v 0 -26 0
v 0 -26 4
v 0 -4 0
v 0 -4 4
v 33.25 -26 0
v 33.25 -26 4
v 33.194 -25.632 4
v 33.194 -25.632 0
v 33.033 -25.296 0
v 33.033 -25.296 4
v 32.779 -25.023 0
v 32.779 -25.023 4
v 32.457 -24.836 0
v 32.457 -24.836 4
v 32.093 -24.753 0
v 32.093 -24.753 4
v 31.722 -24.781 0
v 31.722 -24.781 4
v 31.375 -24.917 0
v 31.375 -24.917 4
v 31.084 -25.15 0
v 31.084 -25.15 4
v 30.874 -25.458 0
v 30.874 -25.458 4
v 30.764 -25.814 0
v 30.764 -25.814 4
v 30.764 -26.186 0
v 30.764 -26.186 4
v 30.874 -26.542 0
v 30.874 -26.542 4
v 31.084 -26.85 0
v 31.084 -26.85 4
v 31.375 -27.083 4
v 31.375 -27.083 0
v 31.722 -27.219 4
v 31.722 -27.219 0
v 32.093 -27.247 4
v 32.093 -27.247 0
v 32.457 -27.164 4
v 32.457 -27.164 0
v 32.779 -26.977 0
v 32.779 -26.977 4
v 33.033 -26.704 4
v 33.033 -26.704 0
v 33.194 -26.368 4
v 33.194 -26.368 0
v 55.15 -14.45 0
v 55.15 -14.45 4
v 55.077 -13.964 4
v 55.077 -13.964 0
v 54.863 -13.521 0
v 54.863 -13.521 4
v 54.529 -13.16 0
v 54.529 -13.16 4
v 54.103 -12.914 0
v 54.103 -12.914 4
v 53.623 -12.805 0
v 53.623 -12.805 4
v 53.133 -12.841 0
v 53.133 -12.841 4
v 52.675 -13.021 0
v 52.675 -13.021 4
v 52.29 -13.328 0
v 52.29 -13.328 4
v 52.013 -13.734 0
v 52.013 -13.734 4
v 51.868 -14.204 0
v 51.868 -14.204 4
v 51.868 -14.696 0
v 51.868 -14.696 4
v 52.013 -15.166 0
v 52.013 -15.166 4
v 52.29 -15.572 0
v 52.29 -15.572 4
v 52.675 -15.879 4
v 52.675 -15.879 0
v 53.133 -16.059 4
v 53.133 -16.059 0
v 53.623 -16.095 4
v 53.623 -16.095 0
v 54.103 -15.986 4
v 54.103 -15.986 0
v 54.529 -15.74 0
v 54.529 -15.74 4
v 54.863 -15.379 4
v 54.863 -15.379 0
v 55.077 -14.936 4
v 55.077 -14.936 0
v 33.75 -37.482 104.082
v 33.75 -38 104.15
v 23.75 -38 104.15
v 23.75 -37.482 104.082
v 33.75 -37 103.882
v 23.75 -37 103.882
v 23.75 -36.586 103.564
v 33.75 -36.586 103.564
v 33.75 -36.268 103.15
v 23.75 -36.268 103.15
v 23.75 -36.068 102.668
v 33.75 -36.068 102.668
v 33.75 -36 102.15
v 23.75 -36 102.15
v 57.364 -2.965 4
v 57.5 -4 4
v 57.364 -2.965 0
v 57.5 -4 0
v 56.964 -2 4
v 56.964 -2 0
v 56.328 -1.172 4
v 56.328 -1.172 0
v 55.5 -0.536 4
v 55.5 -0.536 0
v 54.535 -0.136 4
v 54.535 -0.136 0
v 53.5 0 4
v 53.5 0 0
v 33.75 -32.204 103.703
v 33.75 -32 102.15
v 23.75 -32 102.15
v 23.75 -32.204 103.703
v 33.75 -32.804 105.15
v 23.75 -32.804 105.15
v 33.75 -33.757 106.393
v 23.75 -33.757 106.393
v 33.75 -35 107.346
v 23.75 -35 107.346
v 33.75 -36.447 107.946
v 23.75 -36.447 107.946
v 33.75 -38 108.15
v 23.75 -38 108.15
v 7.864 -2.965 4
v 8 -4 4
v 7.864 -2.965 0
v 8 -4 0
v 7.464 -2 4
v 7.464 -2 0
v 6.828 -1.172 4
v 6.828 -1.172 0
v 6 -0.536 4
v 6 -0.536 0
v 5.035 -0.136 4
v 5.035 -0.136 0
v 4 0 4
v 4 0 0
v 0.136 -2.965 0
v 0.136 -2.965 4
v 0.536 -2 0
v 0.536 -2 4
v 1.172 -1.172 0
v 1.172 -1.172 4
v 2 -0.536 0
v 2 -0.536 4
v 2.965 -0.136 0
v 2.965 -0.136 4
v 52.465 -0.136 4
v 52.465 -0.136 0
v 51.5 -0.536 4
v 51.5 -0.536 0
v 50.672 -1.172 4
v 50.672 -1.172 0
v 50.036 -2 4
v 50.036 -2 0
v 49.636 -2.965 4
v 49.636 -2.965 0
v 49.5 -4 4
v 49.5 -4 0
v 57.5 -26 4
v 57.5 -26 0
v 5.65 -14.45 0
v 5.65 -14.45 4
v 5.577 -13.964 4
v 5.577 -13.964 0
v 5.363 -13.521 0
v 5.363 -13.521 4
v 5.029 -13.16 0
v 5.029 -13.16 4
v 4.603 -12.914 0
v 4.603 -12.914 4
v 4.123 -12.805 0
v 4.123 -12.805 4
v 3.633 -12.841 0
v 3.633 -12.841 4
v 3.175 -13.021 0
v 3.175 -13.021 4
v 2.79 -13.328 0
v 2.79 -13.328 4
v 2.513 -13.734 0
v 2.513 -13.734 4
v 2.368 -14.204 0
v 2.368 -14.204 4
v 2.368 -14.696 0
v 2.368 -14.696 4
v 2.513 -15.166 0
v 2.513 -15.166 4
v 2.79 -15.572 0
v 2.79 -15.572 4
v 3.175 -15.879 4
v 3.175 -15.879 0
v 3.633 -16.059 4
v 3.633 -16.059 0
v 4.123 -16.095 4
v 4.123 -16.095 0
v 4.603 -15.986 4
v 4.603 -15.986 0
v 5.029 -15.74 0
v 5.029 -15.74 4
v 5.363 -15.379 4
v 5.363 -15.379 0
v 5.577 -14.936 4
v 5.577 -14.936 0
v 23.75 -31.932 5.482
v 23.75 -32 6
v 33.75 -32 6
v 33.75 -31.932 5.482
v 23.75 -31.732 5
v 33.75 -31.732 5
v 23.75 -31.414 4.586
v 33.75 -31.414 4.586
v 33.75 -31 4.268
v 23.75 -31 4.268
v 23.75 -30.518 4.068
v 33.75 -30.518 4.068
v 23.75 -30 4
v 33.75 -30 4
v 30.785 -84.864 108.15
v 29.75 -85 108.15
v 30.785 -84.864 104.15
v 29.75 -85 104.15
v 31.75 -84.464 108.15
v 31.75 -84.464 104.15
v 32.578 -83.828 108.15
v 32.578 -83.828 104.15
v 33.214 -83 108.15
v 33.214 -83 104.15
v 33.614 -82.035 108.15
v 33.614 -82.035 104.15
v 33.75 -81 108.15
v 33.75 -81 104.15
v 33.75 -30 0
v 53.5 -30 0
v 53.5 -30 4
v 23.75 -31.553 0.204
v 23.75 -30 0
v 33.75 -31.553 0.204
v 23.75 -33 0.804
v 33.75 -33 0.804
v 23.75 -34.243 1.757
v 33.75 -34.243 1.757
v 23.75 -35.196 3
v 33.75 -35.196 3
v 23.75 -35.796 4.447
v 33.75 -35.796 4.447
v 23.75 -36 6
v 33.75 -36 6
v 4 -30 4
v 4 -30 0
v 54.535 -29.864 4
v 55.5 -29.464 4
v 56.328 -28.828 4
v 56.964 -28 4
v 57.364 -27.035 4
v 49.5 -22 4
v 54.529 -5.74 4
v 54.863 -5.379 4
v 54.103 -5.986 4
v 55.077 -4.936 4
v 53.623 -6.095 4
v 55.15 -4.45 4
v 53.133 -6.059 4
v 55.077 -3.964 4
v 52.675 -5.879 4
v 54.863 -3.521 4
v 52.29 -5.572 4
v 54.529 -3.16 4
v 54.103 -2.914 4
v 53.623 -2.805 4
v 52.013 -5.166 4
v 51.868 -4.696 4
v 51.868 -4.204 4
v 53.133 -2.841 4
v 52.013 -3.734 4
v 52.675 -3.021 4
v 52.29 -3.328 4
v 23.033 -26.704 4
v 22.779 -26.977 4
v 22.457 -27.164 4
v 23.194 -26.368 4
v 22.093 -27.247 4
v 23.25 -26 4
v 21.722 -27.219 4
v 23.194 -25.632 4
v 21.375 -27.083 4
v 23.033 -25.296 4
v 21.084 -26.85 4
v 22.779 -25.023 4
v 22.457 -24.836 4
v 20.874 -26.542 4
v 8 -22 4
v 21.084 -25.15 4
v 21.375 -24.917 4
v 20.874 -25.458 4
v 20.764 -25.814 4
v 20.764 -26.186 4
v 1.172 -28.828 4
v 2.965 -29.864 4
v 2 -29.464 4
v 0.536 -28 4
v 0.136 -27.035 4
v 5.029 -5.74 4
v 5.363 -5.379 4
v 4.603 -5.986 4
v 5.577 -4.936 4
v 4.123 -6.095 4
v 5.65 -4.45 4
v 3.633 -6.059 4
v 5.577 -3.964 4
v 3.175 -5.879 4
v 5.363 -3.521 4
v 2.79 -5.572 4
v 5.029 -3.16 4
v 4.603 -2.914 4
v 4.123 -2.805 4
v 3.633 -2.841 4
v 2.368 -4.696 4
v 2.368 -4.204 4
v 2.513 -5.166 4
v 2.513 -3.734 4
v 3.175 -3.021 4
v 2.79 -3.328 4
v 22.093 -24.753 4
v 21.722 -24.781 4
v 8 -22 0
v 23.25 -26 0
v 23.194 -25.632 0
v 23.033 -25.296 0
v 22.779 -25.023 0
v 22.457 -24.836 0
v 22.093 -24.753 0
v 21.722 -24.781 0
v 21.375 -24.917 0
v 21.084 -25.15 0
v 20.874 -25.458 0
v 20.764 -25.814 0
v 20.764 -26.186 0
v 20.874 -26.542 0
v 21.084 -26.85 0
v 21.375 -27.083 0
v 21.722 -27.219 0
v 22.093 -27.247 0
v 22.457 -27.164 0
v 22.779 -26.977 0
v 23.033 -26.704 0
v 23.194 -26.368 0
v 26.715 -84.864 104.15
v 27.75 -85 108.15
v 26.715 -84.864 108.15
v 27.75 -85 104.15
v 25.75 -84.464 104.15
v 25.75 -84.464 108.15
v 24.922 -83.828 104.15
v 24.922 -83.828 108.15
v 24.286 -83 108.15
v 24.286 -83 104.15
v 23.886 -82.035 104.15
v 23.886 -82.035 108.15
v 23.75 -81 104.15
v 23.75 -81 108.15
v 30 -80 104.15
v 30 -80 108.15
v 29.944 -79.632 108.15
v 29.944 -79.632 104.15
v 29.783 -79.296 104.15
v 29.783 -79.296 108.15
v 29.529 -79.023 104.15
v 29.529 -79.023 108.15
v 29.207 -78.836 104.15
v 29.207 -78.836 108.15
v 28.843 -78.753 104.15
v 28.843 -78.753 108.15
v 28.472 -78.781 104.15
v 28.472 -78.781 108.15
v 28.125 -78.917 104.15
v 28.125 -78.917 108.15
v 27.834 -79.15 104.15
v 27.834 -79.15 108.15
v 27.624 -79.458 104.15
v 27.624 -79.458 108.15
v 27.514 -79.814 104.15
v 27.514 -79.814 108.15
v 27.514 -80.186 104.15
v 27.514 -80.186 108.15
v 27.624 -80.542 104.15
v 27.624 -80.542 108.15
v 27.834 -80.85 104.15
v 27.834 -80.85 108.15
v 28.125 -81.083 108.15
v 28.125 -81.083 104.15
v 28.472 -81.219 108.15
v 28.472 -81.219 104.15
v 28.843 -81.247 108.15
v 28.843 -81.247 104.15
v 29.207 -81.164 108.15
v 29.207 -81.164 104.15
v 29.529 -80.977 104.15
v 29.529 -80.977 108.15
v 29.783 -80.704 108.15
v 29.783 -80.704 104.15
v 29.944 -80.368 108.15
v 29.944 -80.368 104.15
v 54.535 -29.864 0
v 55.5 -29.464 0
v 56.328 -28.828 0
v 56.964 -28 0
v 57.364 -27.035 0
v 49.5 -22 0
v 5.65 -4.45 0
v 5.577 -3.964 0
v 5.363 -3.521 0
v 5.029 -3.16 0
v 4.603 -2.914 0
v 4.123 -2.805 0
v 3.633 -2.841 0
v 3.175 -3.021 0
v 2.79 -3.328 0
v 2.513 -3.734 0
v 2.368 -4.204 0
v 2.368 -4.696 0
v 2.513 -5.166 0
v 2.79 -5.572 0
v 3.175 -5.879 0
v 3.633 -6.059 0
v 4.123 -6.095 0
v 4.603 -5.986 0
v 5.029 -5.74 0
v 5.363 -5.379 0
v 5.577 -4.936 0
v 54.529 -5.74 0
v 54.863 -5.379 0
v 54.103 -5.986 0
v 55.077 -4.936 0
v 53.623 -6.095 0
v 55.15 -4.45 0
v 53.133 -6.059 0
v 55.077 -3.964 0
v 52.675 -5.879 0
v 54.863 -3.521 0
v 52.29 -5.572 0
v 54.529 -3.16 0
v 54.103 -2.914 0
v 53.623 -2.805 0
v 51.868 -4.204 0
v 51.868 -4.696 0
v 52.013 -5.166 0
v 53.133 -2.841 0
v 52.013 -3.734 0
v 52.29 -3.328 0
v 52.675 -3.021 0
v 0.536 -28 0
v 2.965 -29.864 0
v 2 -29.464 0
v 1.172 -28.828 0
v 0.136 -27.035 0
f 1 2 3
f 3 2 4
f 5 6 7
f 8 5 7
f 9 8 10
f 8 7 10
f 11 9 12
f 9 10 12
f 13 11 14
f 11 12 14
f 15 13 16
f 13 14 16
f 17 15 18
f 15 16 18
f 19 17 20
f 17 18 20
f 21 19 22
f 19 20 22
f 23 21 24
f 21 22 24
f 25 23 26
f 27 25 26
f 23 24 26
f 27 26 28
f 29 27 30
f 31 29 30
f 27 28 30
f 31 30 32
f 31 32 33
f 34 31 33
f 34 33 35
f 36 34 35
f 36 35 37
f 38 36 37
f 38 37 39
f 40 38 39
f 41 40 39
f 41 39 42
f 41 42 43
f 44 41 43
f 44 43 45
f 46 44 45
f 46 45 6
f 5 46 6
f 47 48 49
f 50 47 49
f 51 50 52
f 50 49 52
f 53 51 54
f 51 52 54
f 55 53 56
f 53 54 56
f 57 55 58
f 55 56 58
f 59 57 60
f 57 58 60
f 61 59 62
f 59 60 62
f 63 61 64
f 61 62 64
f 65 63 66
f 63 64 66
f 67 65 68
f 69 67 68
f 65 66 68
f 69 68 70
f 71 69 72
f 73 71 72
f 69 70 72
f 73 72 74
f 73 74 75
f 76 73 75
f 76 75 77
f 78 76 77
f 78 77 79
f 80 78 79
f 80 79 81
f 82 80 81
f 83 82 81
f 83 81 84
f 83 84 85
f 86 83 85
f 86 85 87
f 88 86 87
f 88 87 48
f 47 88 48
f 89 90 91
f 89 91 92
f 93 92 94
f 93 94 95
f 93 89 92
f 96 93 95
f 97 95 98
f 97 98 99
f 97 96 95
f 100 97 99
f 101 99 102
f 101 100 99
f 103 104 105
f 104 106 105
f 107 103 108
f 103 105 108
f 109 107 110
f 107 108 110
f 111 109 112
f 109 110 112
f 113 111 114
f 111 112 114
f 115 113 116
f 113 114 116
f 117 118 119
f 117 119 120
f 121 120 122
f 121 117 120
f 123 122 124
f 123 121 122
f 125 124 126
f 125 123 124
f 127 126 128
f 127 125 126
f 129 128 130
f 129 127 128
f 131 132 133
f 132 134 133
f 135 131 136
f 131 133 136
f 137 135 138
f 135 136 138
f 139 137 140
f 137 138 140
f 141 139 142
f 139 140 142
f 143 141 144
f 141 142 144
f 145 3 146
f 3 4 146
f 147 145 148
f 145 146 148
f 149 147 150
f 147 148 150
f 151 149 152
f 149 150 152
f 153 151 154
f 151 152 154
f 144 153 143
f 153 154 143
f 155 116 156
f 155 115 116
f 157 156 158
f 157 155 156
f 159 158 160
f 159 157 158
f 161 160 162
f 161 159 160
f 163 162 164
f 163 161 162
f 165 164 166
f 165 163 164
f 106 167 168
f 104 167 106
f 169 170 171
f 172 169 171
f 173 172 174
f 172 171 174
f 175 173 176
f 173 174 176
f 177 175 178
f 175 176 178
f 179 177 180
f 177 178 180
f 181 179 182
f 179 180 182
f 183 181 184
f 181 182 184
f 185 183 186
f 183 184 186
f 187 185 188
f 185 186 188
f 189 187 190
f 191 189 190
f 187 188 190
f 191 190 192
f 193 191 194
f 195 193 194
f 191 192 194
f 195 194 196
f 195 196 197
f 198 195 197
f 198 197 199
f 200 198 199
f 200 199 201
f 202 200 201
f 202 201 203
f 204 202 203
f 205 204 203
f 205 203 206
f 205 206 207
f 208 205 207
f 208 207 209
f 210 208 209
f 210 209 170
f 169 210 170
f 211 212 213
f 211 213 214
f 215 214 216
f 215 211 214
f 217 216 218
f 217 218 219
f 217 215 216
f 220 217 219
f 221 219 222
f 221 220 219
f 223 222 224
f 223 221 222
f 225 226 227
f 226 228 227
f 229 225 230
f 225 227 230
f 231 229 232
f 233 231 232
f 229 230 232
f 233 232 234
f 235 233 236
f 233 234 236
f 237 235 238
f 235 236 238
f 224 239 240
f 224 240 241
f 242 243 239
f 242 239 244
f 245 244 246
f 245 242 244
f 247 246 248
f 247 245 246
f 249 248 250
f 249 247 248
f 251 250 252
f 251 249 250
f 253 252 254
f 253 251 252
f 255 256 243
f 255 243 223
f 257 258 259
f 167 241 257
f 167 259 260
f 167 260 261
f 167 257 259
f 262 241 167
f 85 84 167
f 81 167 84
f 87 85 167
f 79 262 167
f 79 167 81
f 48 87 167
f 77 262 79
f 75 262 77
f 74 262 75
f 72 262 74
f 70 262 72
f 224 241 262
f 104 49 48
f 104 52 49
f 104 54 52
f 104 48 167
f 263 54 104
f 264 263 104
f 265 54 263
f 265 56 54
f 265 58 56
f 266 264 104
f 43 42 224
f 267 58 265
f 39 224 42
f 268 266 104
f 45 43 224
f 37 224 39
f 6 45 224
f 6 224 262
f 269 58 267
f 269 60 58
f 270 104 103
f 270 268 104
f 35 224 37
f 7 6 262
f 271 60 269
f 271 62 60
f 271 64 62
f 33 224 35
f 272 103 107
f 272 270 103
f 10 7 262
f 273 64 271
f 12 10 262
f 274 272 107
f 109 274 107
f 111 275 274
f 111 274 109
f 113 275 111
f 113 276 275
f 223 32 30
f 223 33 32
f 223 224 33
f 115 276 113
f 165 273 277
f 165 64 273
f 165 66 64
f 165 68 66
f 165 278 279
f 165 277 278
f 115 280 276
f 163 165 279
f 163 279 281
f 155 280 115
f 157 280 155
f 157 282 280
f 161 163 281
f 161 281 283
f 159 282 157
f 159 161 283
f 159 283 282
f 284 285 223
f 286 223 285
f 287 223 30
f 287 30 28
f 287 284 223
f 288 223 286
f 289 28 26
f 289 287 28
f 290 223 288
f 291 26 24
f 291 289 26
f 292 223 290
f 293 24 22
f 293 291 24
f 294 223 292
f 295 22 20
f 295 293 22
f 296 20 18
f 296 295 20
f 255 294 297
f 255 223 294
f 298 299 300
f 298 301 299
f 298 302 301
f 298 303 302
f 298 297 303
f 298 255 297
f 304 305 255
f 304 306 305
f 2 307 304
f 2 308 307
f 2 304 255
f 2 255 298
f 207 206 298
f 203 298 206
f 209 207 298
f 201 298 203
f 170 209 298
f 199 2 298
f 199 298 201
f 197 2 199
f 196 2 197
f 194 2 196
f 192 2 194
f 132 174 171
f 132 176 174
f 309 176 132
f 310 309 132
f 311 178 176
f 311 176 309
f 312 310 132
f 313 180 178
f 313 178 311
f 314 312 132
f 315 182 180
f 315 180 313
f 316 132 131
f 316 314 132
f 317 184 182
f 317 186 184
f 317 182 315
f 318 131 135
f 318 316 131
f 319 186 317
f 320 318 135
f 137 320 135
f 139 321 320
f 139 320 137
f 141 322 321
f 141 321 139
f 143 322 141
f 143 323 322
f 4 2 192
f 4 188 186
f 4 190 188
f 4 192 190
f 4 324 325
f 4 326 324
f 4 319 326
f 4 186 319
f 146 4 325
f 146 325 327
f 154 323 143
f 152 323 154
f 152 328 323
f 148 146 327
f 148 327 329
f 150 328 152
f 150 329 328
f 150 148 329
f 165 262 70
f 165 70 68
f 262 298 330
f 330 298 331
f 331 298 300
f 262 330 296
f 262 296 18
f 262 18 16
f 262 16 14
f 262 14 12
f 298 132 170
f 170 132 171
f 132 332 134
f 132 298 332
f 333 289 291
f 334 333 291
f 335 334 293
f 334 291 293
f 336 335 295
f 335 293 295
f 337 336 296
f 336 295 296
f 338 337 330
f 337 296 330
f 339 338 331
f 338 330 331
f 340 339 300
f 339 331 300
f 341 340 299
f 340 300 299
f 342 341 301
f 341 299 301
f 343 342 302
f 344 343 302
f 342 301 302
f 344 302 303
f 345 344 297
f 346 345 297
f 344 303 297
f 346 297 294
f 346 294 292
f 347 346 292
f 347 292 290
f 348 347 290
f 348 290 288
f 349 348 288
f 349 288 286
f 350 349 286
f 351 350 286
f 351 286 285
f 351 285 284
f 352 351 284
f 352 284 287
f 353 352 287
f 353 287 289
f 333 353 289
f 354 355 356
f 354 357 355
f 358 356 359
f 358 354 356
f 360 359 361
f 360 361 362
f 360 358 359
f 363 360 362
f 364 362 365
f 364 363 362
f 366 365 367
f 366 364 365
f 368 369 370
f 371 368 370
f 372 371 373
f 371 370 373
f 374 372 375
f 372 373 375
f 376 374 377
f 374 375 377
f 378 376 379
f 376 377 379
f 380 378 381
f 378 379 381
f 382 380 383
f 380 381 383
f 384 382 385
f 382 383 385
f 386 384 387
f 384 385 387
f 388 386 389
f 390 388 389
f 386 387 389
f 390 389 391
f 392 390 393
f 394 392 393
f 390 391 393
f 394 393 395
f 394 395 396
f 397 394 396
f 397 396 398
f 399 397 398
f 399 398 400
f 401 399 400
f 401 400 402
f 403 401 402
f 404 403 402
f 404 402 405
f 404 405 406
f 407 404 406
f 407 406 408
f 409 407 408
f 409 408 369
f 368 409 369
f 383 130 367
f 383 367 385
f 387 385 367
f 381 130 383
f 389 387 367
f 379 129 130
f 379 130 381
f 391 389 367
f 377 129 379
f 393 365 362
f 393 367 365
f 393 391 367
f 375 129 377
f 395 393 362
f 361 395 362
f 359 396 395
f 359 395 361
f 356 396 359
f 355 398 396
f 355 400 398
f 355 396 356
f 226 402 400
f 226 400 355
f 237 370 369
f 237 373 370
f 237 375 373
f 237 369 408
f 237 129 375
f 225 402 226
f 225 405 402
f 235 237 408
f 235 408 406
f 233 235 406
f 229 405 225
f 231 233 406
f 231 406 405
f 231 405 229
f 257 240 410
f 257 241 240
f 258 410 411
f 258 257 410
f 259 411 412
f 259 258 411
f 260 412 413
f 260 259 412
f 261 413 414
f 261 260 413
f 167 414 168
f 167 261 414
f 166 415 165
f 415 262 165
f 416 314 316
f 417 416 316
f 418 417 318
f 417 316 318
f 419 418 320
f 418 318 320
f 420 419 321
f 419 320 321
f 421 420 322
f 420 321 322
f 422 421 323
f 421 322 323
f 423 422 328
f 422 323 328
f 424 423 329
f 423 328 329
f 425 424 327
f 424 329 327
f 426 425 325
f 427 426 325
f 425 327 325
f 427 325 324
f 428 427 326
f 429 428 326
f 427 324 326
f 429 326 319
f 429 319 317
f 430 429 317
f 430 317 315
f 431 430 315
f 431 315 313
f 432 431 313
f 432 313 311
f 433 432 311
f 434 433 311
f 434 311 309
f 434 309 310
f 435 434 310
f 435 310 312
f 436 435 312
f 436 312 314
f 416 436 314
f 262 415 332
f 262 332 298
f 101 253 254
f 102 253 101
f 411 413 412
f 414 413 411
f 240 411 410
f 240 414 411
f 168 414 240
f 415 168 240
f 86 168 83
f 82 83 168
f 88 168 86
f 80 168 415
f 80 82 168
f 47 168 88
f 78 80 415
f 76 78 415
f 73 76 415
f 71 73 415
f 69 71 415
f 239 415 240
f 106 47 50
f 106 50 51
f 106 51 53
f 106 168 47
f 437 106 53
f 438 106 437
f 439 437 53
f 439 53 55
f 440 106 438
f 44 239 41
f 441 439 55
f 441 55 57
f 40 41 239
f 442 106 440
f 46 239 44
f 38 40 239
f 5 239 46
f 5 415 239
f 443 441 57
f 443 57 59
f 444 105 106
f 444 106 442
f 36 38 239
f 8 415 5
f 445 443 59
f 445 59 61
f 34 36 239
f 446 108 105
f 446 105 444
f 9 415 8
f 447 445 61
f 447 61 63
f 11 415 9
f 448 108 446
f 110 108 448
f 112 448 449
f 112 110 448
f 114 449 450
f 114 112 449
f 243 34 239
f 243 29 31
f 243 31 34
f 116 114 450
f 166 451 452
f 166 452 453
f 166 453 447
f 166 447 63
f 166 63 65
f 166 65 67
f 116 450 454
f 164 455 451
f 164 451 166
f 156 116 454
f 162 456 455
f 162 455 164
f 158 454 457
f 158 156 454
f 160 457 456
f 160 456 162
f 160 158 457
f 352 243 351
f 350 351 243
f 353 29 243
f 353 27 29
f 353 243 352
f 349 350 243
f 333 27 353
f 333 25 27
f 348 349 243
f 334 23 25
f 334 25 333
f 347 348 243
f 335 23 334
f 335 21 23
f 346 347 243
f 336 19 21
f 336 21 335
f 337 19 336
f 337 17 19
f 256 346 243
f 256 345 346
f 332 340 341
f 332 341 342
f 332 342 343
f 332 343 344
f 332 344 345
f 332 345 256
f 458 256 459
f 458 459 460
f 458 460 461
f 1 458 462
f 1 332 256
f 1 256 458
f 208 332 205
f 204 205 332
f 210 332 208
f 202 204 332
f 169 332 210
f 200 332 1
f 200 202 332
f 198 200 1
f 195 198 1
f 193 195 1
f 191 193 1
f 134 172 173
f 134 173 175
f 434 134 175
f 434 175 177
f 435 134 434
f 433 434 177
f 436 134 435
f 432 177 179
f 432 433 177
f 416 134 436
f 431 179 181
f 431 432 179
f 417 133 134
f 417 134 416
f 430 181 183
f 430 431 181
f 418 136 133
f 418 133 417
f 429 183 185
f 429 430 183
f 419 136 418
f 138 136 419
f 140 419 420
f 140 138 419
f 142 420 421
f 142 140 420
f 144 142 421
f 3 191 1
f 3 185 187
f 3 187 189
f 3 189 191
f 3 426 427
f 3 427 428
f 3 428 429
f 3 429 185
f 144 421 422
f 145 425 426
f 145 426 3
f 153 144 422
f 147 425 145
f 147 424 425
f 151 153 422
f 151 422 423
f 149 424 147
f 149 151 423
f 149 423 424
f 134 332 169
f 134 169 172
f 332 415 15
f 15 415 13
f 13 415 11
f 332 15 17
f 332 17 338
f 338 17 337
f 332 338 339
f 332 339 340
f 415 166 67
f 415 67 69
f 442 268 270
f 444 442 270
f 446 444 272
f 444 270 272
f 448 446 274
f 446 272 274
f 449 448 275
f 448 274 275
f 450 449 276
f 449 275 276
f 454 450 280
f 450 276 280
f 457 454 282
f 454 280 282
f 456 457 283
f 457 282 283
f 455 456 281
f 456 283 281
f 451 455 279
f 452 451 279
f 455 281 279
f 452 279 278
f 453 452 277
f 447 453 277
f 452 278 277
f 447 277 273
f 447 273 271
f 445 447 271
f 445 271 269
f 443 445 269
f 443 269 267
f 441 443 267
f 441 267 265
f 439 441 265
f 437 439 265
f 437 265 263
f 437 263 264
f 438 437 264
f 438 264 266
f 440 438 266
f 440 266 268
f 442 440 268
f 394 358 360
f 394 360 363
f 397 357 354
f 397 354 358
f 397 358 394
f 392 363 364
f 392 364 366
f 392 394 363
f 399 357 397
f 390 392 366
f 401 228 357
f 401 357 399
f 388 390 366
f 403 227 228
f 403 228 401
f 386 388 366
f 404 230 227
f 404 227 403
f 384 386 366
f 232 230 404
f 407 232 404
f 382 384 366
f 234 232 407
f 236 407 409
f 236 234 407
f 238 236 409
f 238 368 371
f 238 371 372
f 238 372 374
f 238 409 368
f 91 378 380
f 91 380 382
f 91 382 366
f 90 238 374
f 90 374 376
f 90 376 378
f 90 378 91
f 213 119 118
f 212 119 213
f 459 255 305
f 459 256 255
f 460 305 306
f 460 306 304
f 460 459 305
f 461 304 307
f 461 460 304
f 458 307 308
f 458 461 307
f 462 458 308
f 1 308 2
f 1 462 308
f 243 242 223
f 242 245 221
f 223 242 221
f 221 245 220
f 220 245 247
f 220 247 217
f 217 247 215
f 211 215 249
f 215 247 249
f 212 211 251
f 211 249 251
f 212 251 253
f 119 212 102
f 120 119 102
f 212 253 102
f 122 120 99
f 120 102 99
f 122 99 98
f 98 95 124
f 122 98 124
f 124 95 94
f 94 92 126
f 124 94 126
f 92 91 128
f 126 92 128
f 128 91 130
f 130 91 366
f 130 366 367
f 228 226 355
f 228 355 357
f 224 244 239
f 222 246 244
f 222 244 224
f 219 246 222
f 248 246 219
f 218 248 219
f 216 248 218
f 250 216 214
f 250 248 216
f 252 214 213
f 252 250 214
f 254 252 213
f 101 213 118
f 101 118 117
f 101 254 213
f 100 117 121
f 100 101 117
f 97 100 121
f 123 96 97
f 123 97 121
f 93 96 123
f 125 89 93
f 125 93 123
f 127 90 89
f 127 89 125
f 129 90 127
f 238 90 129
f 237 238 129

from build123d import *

# Parameters (mm, degrees)
EXTRUDE_1_DEPTH                  = 3
SHEET_METAL_1_OUTLINE_W          = 8
SHEET_METAL_1_OUTLINE_H          = 1
SHEET_METAL_1_DEPTH              = 57.5
SHEET_METAL_1_2_OUTLINE_W        = 22
SHEET_METAL_1_2_OUTLINE_H        = 1
SHEET_METAL_1_2_DEPTH            = 8
SHEET_START                      = 49.5
SHEET_METAL_1_3_OUTLINE_W        = 22
SHEET_METAL_1_3_OUTLINE_H        = 1
SHEET_METAL_1_3_DEPTH            = 8
SM_EDGE_FLANGE_1_DEPTH           = 10
SM_EDGE_FLANGE_2_STRIP_W         = 20
SM_EDGE_FLANGE_2_STRIP_H         = 4
SM_EDGE_FLANGE_2_STRIP_CUT_DEPTH = 10
SM_EDGE_FLANGE_2_DEPTH           = 10
FILLET_1_R                       = 4
M4X0_7_1_D                       = 3.3
M3X0_5_1_D                       = 2.5
M3X0_5_2_D                       = 2.5


# Read off the part's stored shape, not the designer's step: 轉換-實體1
# Sheet-metal steps are written as plain solids
with BuildPart() as part:
    # Sketch 1 → 填料-伸長1 (new body)
    with BuildSketch(Plane.XY):
        Polygon((8, 0), (8, -22), (49.5, -22), (49.5, 0), (57.5, 0), (57.5, -30), (8, -30), (0, -30), (0, 0), align=None)
    extrude(amount=EXTRUDE_1_DEPTH)

    # Sheet Metal 1 outline → Sheet Metal 1 (add)
    with BuildSketch(Plane.YZ):
        with Locations((-26, 3.5)):
            Rectangle(SHEET_METAL_1_OUTLINE_W, SHEET_METAL_1_OUTLINE_H)
    extrude(amount=SHEET_METAL_1_DEPTH)

    # Sheet Metal 1 2 outline → Sheet Metal 1 2 (add)
    with BuildSketch(Plane.YZ):
        with Locations((-11, 3.5)):
            Rectangle(SHEET_METAL_1_2_OUTLINE_W, SHEET_METAL_1_2_OUTLINE_H)
    extrude(amount=SHEET_METAL_1_2_DEPTH)

    # Sheet Metal 1 3 outline → Sheet Metal 1 3 (add)
    with BuildSketch(Plane.YZ.offset(SHEET_START)):
        with Locations((-11, 3.5)):
            Rectangle(SHEET_METAL_1_3_OUTLINE_W, SHEET_METAL_1_3_OUTLINE_H)
    extrude(amount=SHEET_METAL_1_3_DEPTH)

    # 邊線-凸緣1 section (across the edge) → 邊線-凸緣1 (add)
    with BuildSketch(Plane(origin=(23.75, -32, 4), x_dir=(0, 1, 0), z_dir=(1, 0, 0))):
        with BuildLine():
            Line((-4, 2), (-4, 104.15))
            Line((-4, 104.15), (0, 104.15))
            Line((0, 104.15), (0, 2))
            ThreePointArc((0, 2), (0.585786438, 0.585786438), (2, 0))
            Line((2, 0), (2, -4))
            ThreePointArc((2, -4), (-2.242640687, -2.242640687), (-4, 2))
        make_face()
    extrude(amount=SM_EDGE_FLANGE_1_DEPTH)

    # 邊線-凸緣2 strip (across the edge) → 邊線-凸緣2 strip cut (cut)
    with BuildSketch(Plane(origin=(33.75, -36, 108.15), x_dir=(0, 0, -1), z_dir=(-1, 0, 0))):
        with Locations((-4, -2)):
            Rectangle(SM_EDGE_FLANGE_2_STRIP_W, SM_EDGE_FLANGE_2_STRIP_H)
    extrude(amount=SM_EDGE_FLANGE_2_STRIP_CUT_DEPTH, mode=Mode.SUBTRACT)

    # 邊線-凸緣2 section (across the edge) → 邊線-凸緣2 (add)
    with BuildSketch(Plane(origin=(33.75, -36, 108.15), x_dir=(0, 0, -1), z_dir=(-1, 0, 0))):
        with BuildLine():
            Line((0, 2), (0, 49))
            Line((0, 49), (4, 49))
            Line((4, 49), (4, 2))
            ThreePointArc((4, 2), (4.585786438, 0.585786438), (6, 0))
            Line((6, 0), (6, -4))
            ThreePointArc((6, -4), (1.757359313, -2.242640687), (0, 2))
        make_face()
    extrude(amount=SM_EDGE_FLANGE_2_DEPTH)

    # 圓角1
    fillet_1_edges = [part.edges().sort_by_distance(p)[0] for p in [
        (0, -30, 2),
        (57.5, -30, 2),
        (57.5, 0, 2),
        (49.5, 0, 2),
        (8, 0, 2),
        (0, 0, 2),
        (33.75, -85, 106.15),
        (23.75, -85, 106.15),
    ]]
    fillet(fillet_1_edges, radius=FILLET_1_R - 0.0001)  # a hair under: the kernel refuses the full size

    # M4x0.7 螺紋孔1 (through all)
    with Locations(Plane(origin=(53.5, -4.45, 0), x_dir=(-1, 0, 0), z_dir=(0, 0, -1))):
        with Locations((0, 0), (0, -10), (49.5, -10), (49.5, 0)):
            Hole(M4X0_7_1_D / 2)

    # M3x0.5 螺紋孔1 (through all)
    with Locations(Plane(origin=(28.75, -80, 104.15), x_dir=(-1, 0, 0), z_dir=(0, 0, -1))):
        with Locations((0, 0)):
            Hole(M3X0_5_1_D / 2)

    # M3x0.5 螺紋孔2 (through all)
    with Locations(Plane(origin=(22, -26, 0), x_dir=(-1, 0, 0), z_dir=(0, 0, -1))):
        with Locations((0, 0), (-10, 0)):
            Hole(M3X0_5_2_D / 2)


solid = part.part
